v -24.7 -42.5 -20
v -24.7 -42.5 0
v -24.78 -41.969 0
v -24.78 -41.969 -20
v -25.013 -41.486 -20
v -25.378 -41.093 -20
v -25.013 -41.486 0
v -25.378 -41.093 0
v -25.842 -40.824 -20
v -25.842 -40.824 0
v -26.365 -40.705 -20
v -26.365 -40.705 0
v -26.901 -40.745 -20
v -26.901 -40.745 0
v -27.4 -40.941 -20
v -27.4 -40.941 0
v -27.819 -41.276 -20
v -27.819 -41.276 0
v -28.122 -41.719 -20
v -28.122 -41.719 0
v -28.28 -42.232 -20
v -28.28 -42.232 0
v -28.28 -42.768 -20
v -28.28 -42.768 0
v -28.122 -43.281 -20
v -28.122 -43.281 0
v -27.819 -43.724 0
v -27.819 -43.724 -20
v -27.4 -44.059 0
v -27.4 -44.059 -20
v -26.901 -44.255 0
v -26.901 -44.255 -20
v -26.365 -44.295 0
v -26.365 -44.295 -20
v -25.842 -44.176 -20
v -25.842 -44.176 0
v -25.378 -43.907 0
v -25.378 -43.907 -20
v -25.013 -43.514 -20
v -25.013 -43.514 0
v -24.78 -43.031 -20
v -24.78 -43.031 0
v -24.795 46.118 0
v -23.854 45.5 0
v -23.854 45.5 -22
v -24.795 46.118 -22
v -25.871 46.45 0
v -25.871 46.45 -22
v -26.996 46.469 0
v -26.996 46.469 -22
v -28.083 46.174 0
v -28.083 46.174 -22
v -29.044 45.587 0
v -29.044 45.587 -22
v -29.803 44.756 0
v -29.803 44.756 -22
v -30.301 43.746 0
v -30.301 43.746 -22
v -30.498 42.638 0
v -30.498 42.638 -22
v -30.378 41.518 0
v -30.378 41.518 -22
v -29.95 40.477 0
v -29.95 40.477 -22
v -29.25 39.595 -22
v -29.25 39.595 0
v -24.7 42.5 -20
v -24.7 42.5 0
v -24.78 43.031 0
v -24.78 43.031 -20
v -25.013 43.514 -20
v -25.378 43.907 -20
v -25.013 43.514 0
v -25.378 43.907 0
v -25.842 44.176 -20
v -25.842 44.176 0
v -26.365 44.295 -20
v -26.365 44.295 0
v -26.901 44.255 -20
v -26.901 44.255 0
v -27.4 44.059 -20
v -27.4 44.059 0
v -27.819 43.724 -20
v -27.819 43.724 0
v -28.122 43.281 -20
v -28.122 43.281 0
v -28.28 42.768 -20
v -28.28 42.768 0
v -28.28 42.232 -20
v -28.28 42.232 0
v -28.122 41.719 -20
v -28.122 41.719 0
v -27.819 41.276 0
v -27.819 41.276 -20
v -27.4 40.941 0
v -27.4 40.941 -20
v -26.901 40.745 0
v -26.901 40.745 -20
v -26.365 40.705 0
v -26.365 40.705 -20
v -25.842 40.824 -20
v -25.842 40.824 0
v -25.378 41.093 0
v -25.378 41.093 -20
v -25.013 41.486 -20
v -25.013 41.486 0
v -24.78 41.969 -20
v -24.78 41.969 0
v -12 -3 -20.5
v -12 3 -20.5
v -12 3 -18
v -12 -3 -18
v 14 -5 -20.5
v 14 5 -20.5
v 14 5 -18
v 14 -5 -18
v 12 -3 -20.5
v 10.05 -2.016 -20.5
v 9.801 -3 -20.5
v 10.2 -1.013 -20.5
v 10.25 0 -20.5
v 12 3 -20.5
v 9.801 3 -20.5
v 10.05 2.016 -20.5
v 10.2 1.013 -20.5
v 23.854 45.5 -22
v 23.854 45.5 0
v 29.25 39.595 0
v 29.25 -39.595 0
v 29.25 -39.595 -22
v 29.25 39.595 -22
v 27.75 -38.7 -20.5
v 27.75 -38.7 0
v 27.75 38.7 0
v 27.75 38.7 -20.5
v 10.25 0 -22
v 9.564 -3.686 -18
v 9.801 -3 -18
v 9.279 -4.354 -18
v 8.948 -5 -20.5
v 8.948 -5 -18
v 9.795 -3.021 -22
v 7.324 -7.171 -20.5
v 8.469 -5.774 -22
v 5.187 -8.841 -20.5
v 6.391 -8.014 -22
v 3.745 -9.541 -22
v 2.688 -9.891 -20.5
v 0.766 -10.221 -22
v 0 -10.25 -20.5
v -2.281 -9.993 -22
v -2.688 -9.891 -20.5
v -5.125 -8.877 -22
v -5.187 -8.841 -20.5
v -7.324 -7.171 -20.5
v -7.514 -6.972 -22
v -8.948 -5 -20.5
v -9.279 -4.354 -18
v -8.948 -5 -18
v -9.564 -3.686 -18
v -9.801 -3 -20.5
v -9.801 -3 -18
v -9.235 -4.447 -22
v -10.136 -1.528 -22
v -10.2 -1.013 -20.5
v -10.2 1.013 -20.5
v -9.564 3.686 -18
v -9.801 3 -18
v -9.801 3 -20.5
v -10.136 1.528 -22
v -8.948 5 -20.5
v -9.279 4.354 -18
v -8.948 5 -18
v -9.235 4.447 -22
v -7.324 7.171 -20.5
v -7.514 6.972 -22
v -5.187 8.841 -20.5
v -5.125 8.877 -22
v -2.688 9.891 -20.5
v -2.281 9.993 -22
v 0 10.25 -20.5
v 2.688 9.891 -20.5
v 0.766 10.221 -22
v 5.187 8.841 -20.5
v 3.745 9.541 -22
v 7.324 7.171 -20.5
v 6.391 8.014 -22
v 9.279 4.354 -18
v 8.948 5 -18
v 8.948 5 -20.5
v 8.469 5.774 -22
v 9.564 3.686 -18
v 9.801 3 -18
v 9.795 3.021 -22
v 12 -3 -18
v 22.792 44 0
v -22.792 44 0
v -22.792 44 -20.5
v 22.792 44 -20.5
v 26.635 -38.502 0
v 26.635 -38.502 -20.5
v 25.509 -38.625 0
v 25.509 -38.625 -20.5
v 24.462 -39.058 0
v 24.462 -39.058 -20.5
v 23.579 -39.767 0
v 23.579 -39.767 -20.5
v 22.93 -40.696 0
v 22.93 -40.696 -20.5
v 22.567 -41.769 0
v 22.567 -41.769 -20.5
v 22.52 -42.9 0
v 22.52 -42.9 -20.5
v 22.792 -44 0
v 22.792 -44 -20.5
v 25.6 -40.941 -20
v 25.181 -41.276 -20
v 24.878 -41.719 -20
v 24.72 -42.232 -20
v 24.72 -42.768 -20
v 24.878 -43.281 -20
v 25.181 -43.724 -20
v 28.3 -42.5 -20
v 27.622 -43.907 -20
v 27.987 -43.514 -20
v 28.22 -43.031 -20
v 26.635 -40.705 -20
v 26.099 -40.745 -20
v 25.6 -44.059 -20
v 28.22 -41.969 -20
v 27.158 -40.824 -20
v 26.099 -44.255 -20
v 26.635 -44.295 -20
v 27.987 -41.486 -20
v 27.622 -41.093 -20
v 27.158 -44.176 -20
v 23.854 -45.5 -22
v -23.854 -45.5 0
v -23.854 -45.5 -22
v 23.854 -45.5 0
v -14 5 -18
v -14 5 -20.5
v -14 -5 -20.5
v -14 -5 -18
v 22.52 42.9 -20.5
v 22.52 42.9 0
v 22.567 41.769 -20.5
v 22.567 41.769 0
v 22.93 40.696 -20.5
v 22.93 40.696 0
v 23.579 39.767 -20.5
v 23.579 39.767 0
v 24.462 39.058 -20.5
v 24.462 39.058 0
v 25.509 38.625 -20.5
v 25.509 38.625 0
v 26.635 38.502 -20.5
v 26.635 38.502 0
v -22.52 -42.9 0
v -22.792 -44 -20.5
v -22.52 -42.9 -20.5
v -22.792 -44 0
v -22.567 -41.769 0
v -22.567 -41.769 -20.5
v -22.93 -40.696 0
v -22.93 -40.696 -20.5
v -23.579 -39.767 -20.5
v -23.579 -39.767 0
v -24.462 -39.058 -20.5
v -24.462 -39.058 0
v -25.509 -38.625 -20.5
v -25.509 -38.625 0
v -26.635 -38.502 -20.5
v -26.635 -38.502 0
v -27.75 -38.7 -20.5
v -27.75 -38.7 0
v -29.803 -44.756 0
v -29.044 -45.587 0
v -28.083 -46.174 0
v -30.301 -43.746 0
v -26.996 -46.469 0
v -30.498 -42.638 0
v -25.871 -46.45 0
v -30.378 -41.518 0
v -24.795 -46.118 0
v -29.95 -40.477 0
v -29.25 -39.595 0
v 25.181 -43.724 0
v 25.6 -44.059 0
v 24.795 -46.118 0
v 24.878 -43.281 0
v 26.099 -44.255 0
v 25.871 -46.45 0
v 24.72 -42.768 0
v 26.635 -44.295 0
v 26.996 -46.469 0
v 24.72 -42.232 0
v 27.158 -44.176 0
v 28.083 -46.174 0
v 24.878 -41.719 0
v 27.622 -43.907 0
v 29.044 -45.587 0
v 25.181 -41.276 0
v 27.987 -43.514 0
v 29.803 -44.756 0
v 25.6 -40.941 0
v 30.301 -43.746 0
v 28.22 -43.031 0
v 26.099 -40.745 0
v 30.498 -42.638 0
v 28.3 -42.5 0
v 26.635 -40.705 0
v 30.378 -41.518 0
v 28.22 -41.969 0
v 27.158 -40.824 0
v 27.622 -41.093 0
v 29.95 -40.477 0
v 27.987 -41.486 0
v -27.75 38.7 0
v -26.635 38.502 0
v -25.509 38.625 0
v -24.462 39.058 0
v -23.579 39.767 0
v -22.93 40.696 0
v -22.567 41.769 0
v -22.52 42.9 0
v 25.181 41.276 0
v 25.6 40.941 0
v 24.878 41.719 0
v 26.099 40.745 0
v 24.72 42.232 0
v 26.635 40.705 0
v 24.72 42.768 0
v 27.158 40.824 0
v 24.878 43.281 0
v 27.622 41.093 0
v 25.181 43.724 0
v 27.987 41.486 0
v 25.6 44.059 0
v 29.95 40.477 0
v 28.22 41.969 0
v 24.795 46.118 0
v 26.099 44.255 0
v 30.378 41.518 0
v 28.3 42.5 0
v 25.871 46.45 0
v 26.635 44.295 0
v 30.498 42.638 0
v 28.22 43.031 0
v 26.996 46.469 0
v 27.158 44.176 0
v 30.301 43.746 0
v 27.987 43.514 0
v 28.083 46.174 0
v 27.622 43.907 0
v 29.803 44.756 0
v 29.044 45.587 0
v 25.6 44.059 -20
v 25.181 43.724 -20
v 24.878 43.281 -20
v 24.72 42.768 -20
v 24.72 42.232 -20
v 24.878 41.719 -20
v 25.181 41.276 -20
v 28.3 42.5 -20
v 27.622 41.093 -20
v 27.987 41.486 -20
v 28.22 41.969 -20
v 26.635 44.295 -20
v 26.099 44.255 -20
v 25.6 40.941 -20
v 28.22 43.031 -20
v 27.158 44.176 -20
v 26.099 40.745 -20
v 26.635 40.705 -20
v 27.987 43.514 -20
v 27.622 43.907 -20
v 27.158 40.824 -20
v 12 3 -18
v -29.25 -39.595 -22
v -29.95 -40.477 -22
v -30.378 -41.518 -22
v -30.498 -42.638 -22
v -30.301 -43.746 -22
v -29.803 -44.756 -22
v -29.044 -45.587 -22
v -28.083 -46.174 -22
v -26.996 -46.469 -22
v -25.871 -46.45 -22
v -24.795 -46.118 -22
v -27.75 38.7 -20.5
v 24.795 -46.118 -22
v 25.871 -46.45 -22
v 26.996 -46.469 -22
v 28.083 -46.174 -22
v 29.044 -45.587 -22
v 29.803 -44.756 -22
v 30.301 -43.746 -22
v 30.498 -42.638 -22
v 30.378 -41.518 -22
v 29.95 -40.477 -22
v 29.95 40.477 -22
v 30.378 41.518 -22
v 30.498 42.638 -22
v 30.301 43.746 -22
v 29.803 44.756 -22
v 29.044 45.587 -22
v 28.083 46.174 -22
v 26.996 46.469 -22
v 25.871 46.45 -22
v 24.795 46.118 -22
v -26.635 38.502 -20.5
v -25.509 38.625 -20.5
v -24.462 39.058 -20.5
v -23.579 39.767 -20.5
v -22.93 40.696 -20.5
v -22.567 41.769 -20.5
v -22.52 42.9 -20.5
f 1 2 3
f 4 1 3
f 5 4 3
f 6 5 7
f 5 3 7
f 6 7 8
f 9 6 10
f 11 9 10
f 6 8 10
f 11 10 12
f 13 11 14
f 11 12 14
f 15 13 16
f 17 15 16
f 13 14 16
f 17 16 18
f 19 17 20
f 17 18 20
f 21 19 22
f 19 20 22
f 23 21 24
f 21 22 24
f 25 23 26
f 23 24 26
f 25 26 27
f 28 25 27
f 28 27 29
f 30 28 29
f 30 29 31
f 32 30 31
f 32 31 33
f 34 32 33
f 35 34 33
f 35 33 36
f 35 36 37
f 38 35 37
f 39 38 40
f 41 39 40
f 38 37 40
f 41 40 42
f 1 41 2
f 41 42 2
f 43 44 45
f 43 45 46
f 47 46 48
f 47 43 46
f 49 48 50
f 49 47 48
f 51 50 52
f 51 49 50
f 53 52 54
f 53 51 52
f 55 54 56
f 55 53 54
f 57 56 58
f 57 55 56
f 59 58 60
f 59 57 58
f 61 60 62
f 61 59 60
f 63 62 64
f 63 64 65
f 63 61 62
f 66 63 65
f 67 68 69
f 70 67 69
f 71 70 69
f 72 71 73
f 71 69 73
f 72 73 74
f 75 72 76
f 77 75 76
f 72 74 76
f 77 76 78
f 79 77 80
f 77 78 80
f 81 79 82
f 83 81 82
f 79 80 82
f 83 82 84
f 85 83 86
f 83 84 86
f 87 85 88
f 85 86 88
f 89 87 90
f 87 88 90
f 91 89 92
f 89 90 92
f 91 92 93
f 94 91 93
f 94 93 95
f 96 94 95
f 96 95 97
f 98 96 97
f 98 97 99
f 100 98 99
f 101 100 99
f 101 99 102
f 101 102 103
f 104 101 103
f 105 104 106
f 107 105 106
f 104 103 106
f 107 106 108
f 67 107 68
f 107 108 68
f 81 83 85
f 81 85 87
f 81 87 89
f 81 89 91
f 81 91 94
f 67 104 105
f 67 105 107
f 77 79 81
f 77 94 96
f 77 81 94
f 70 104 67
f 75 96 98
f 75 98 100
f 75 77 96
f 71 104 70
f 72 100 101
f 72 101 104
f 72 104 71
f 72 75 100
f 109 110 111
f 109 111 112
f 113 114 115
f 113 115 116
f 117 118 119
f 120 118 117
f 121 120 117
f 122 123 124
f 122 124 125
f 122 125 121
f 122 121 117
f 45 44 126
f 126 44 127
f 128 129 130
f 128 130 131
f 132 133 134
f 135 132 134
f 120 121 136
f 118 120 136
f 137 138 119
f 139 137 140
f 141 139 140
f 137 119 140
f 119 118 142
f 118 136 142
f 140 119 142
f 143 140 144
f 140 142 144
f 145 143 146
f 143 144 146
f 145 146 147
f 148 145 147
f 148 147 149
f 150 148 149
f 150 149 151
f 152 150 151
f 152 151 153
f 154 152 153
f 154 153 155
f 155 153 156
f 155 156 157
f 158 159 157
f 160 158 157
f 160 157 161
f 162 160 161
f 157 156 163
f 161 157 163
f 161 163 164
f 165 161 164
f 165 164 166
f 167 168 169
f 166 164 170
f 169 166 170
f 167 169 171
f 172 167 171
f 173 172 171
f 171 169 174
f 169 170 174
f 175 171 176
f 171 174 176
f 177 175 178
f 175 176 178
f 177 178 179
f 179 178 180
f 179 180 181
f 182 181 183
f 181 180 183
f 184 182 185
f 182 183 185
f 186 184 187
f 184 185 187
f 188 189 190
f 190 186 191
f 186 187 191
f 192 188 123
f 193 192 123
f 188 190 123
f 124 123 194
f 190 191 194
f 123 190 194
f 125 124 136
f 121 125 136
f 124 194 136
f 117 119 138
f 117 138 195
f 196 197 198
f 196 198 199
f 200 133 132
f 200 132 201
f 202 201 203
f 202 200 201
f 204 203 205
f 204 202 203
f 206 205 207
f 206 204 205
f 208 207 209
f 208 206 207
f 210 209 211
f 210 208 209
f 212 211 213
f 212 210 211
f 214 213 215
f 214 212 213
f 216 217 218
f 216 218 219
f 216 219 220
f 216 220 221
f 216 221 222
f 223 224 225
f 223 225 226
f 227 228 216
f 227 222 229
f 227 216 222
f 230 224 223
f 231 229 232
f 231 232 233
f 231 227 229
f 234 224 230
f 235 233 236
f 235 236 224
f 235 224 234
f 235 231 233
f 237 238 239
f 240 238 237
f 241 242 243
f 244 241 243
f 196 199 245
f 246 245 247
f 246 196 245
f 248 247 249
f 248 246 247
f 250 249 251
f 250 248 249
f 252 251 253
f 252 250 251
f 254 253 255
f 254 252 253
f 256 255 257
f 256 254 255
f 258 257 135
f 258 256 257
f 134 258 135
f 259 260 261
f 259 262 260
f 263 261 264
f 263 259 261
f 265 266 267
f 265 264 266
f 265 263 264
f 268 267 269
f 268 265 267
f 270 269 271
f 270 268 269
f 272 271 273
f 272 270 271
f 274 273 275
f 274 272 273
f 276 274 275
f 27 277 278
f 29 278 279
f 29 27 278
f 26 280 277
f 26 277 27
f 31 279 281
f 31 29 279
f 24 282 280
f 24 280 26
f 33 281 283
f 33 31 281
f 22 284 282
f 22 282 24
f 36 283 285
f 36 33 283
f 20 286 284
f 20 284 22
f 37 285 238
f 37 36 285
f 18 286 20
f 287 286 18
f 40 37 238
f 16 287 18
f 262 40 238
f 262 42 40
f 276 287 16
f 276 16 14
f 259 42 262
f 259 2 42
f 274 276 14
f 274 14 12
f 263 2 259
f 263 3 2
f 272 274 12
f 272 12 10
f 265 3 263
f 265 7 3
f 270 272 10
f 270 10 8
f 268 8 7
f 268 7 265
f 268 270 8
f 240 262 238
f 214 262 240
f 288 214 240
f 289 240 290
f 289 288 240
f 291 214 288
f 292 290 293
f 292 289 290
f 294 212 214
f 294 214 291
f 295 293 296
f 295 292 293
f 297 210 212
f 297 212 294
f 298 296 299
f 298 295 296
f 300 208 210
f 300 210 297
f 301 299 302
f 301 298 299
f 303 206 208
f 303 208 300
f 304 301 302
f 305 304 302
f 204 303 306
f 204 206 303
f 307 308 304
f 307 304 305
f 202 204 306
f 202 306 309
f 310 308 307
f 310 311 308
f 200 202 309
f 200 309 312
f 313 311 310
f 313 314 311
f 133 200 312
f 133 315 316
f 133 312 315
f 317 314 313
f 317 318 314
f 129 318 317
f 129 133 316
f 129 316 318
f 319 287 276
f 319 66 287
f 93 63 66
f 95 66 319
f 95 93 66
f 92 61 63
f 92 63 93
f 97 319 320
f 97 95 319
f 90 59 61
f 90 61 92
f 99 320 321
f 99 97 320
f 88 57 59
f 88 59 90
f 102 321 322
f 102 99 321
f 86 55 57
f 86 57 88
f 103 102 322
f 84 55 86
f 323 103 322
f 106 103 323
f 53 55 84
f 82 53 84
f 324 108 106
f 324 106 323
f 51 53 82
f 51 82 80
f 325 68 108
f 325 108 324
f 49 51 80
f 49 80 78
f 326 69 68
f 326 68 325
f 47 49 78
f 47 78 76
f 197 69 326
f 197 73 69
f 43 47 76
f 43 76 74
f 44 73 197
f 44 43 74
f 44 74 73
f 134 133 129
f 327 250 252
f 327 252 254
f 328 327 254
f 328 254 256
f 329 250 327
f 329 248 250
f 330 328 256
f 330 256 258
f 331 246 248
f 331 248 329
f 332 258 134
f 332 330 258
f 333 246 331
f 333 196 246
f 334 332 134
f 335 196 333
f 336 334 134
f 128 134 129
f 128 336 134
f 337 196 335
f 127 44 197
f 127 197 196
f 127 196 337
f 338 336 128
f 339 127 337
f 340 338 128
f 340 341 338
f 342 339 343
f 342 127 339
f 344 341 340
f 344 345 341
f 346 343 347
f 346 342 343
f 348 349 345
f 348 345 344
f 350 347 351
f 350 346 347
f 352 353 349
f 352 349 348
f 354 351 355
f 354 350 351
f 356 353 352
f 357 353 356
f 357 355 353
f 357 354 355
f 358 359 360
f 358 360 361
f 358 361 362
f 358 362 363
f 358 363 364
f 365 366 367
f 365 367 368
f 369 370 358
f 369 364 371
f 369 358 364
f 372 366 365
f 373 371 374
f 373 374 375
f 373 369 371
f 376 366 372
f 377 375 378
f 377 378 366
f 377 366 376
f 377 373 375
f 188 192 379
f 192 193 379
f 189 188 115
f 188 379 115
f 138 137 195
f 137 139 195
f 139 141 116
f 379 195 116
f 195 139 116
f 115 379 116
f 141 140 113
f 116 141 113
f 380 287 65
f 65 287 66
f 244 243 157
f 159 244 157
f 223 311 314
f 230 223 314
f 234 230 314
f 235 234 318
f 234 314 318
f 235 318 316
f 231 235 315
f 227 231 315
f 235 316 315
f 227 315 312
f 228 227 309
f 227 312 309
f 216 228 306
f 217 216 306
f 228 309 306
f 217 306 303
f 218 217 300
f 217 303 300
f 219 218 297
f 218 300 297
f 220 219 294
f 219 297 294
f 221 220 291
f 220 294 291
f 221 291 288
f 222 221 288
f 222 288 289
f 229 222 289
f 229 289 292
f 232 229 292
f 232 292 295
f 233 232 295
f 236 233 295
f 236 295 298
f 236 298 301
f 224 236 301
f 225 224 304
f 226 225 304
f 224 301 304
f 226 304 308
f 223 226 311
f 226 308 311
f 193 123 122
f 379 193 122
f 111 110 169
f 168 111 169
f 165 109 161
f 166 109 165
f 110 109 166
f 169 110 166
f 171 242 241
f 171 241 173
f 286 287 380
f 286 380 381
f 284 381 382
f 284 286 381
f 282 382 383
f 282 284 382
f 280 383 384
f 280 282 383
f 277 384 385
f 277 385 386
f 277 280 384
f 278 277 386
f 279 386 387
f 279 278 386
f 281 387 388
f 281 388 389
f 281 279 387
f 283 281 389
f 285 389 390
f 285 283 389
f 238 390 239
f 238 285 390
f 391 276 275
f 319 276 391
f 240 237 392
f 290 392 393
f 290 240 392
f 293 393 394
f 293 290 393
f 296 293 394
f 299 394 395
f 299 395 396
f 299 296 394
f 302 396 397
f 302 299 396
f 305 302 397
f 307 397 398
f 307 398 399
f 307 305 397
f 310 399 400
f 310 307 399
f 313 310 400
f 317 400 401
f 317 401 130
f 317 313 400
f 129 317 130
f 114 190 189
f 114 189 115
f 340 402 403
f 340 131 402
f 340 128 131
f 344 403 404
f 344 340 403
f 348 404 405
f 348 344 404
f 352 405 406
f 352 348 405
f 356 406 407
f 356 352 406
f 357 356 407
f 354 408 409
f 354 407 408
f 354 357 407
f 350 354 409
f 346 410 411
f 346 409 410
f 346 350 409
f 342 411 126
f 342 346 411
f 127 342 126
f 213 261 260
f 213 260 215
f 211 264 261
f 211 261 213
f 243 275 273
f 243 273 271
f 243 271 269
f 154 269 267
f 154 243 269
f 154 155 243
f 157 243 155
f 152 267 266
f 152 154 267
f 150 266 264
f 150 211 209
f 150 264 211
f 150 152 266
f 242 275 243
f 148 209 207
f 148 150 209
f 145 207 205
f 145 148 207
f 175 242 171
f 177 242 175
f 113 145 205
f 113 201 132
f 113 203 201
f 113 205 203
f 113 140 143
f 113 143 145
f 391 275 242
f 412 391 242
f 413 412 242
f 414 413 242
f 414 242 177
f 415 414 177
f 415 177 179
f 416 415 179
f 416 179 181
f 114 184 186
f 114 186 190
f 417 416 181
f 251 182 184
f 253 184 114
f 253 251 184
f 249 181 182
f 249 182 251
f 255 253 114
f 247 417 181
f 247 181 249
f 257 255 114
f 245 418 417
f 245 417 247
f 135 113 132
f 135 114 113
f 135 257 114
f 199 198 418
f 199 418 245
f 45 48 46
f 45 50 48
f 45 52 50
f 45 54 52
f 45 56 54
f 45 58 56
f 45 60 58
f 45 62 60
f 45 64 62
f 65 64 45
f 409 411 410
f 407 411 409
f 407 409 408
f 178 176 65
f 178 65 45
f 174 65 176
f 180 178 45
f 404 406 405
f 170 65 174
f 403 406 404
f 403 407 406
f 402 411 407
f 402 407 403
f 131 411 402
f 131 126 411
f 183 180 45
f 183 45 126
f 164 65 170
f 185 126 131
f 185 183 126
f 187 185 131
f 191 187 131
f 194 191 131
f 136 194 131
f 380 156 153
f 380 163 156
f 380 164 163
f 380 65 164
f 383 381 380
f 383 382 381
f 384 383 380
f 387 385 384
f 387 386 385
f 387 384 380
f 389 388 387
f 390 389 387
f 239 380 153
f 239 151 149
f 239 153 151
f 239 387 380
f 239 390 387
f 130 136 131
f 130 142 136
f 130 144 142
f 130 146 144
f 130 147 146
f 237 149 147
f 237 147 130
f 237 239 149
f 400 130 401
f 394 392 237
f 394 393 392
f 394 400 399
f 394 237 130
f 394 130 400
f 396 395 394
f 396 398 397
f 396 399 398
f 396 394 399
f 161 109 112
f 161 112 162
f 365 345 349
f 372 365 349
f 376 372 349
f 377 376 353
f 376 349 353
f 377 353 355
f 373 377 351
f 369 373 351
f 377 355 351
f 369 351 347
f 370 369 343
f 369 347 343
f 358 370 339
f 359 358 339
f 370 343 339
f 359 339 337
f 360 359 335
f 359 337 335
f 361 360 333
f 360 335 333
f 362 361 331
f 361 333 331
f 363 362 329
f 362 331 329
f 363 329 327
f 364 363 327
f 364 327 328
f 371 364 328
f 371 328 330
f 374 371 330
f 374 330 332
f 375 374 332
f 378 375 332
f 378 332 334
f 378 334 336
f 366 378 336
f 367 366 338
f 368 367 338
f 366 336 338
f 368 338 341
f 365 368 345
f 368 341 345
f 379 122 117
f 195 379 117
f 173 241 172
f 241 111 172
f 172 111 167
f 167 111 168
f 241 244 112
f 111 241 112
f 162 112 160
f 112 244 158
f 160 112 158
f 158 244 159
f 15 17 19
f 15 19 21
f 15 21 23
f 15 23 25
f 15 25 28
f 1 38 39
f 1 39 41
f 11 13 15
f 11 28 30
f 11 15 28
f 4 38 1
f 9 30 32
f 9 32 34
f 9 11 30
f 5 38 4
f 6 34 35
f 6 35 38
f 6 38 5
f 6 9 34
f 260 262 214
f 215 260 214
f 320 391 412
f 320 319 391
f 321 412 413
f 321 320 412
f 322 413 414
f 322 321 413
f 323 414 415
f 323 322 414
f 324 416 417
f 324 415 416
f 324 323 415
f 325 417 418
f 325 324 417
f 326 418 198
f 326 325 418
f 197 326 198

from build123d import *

# Parameters (mm, degrees)
F0_W      = 58.5
F0_H      = 91
F1_DEPTH  = 22
F2_T      = -1.5
F3_R      = 3
F4_R      = 2
F5_R      = 4
F6_DEPTH  = 22
F7_R      = 1.8
F8_DEPTH  = 20
F11_W     = 28
F11_H     = 10
F11_W_2   = 24
F11_H_2   = 6
F12_DEPTH = 4
F10_R     = 10.25
F13_DEPTH = 25


with BuildPart() as f1:
    # F0 (on Top) → F1 (new body)
    with BuildSketch(Plane.XY):
        Rectangle(F0_W, F0_H)
    extrude(amount=-F1_DEPTH)

    # F2
    f2_openings = [f1.faces().sort_by_distance(p)[0] for p in [
        (0, 0, 0),
    ]]
    offset(amount=F2_T, openings=f2_openings)

    # F3
    f3_edges = [f1.edges().sort_by_distance(p)[0] for p in [
        (-29.25, 45.5, -11),
        (29.25, 45.5, -11),
        (-29.25, -45.5, -11),
        (29.25, -45.5, -11),
    ]]
    fillet(f3_edges, radius=F3_R)

    # F4
    f4_edges = [f1.edges().sort_by_distance(p)[0] for p in [
        (-27.75, 44, -10.25),
        (-27.75, -44, -10.25),
        (27.75, -44, -10.25),
        (27.75, 44, -10.25),
    ]]
    fillet(f4_edges, radius=F4_R)

    # F5 (on face) → F6 (join)
    with BuildSketch(Plane.XY):
        with Locations((26.5, -42.5)):
            Circle(F5_R)
        with Locations((26.5, 42.5)):
            Circle(F5_R)
        with Locations((-26.5, 42.5)):
            Circle(F5_R)
        with Locations((-26.5, -42.5)):
            Circle(F5_R)
    extrude(amount=-F6_DEPTH)

    # F7 (on Top) → F8 (cut)
    with BuildSketch(Plane.XY):
        with Locations((26.5, -42.5)):
            Circle(F7_R)
        with Locations((26.5, 42.5)):
            Circle(F7_R)
        with Locations((-26.5, -42.5)):
            Circle(F7_R)
        with Locations((-26.5, 42.5)):
            Circle(F7_R)
    extrude(amount=-F8_DEPTH, mode=Mode.SUBTRACT)

    # F11 (on face) → F12 (join)
    with BuildSketch(Plane(origin=(0, 0, -22), x_dir=(1, 0, 0), z_dir=(0, 0, -1))):
        Rectangle(F11_W, F11_H)
        Rectangle(F11_W_2, F11_H_2, mode=Mode.SUBTRACT)
    extrude(amount=-F12_DEPTH)

    # F10 (on face) → F13 (cut)
    with BuildSketch(Plane(origin=(0, 0, -22), x_dir=(1, 0, 0), z_dir=(0, 0, -1))):
        Circle(F10_R)
    extrude(amount=-F13_DEPTH, mode=Mode.SUBTRACT)


solid = f1.part
